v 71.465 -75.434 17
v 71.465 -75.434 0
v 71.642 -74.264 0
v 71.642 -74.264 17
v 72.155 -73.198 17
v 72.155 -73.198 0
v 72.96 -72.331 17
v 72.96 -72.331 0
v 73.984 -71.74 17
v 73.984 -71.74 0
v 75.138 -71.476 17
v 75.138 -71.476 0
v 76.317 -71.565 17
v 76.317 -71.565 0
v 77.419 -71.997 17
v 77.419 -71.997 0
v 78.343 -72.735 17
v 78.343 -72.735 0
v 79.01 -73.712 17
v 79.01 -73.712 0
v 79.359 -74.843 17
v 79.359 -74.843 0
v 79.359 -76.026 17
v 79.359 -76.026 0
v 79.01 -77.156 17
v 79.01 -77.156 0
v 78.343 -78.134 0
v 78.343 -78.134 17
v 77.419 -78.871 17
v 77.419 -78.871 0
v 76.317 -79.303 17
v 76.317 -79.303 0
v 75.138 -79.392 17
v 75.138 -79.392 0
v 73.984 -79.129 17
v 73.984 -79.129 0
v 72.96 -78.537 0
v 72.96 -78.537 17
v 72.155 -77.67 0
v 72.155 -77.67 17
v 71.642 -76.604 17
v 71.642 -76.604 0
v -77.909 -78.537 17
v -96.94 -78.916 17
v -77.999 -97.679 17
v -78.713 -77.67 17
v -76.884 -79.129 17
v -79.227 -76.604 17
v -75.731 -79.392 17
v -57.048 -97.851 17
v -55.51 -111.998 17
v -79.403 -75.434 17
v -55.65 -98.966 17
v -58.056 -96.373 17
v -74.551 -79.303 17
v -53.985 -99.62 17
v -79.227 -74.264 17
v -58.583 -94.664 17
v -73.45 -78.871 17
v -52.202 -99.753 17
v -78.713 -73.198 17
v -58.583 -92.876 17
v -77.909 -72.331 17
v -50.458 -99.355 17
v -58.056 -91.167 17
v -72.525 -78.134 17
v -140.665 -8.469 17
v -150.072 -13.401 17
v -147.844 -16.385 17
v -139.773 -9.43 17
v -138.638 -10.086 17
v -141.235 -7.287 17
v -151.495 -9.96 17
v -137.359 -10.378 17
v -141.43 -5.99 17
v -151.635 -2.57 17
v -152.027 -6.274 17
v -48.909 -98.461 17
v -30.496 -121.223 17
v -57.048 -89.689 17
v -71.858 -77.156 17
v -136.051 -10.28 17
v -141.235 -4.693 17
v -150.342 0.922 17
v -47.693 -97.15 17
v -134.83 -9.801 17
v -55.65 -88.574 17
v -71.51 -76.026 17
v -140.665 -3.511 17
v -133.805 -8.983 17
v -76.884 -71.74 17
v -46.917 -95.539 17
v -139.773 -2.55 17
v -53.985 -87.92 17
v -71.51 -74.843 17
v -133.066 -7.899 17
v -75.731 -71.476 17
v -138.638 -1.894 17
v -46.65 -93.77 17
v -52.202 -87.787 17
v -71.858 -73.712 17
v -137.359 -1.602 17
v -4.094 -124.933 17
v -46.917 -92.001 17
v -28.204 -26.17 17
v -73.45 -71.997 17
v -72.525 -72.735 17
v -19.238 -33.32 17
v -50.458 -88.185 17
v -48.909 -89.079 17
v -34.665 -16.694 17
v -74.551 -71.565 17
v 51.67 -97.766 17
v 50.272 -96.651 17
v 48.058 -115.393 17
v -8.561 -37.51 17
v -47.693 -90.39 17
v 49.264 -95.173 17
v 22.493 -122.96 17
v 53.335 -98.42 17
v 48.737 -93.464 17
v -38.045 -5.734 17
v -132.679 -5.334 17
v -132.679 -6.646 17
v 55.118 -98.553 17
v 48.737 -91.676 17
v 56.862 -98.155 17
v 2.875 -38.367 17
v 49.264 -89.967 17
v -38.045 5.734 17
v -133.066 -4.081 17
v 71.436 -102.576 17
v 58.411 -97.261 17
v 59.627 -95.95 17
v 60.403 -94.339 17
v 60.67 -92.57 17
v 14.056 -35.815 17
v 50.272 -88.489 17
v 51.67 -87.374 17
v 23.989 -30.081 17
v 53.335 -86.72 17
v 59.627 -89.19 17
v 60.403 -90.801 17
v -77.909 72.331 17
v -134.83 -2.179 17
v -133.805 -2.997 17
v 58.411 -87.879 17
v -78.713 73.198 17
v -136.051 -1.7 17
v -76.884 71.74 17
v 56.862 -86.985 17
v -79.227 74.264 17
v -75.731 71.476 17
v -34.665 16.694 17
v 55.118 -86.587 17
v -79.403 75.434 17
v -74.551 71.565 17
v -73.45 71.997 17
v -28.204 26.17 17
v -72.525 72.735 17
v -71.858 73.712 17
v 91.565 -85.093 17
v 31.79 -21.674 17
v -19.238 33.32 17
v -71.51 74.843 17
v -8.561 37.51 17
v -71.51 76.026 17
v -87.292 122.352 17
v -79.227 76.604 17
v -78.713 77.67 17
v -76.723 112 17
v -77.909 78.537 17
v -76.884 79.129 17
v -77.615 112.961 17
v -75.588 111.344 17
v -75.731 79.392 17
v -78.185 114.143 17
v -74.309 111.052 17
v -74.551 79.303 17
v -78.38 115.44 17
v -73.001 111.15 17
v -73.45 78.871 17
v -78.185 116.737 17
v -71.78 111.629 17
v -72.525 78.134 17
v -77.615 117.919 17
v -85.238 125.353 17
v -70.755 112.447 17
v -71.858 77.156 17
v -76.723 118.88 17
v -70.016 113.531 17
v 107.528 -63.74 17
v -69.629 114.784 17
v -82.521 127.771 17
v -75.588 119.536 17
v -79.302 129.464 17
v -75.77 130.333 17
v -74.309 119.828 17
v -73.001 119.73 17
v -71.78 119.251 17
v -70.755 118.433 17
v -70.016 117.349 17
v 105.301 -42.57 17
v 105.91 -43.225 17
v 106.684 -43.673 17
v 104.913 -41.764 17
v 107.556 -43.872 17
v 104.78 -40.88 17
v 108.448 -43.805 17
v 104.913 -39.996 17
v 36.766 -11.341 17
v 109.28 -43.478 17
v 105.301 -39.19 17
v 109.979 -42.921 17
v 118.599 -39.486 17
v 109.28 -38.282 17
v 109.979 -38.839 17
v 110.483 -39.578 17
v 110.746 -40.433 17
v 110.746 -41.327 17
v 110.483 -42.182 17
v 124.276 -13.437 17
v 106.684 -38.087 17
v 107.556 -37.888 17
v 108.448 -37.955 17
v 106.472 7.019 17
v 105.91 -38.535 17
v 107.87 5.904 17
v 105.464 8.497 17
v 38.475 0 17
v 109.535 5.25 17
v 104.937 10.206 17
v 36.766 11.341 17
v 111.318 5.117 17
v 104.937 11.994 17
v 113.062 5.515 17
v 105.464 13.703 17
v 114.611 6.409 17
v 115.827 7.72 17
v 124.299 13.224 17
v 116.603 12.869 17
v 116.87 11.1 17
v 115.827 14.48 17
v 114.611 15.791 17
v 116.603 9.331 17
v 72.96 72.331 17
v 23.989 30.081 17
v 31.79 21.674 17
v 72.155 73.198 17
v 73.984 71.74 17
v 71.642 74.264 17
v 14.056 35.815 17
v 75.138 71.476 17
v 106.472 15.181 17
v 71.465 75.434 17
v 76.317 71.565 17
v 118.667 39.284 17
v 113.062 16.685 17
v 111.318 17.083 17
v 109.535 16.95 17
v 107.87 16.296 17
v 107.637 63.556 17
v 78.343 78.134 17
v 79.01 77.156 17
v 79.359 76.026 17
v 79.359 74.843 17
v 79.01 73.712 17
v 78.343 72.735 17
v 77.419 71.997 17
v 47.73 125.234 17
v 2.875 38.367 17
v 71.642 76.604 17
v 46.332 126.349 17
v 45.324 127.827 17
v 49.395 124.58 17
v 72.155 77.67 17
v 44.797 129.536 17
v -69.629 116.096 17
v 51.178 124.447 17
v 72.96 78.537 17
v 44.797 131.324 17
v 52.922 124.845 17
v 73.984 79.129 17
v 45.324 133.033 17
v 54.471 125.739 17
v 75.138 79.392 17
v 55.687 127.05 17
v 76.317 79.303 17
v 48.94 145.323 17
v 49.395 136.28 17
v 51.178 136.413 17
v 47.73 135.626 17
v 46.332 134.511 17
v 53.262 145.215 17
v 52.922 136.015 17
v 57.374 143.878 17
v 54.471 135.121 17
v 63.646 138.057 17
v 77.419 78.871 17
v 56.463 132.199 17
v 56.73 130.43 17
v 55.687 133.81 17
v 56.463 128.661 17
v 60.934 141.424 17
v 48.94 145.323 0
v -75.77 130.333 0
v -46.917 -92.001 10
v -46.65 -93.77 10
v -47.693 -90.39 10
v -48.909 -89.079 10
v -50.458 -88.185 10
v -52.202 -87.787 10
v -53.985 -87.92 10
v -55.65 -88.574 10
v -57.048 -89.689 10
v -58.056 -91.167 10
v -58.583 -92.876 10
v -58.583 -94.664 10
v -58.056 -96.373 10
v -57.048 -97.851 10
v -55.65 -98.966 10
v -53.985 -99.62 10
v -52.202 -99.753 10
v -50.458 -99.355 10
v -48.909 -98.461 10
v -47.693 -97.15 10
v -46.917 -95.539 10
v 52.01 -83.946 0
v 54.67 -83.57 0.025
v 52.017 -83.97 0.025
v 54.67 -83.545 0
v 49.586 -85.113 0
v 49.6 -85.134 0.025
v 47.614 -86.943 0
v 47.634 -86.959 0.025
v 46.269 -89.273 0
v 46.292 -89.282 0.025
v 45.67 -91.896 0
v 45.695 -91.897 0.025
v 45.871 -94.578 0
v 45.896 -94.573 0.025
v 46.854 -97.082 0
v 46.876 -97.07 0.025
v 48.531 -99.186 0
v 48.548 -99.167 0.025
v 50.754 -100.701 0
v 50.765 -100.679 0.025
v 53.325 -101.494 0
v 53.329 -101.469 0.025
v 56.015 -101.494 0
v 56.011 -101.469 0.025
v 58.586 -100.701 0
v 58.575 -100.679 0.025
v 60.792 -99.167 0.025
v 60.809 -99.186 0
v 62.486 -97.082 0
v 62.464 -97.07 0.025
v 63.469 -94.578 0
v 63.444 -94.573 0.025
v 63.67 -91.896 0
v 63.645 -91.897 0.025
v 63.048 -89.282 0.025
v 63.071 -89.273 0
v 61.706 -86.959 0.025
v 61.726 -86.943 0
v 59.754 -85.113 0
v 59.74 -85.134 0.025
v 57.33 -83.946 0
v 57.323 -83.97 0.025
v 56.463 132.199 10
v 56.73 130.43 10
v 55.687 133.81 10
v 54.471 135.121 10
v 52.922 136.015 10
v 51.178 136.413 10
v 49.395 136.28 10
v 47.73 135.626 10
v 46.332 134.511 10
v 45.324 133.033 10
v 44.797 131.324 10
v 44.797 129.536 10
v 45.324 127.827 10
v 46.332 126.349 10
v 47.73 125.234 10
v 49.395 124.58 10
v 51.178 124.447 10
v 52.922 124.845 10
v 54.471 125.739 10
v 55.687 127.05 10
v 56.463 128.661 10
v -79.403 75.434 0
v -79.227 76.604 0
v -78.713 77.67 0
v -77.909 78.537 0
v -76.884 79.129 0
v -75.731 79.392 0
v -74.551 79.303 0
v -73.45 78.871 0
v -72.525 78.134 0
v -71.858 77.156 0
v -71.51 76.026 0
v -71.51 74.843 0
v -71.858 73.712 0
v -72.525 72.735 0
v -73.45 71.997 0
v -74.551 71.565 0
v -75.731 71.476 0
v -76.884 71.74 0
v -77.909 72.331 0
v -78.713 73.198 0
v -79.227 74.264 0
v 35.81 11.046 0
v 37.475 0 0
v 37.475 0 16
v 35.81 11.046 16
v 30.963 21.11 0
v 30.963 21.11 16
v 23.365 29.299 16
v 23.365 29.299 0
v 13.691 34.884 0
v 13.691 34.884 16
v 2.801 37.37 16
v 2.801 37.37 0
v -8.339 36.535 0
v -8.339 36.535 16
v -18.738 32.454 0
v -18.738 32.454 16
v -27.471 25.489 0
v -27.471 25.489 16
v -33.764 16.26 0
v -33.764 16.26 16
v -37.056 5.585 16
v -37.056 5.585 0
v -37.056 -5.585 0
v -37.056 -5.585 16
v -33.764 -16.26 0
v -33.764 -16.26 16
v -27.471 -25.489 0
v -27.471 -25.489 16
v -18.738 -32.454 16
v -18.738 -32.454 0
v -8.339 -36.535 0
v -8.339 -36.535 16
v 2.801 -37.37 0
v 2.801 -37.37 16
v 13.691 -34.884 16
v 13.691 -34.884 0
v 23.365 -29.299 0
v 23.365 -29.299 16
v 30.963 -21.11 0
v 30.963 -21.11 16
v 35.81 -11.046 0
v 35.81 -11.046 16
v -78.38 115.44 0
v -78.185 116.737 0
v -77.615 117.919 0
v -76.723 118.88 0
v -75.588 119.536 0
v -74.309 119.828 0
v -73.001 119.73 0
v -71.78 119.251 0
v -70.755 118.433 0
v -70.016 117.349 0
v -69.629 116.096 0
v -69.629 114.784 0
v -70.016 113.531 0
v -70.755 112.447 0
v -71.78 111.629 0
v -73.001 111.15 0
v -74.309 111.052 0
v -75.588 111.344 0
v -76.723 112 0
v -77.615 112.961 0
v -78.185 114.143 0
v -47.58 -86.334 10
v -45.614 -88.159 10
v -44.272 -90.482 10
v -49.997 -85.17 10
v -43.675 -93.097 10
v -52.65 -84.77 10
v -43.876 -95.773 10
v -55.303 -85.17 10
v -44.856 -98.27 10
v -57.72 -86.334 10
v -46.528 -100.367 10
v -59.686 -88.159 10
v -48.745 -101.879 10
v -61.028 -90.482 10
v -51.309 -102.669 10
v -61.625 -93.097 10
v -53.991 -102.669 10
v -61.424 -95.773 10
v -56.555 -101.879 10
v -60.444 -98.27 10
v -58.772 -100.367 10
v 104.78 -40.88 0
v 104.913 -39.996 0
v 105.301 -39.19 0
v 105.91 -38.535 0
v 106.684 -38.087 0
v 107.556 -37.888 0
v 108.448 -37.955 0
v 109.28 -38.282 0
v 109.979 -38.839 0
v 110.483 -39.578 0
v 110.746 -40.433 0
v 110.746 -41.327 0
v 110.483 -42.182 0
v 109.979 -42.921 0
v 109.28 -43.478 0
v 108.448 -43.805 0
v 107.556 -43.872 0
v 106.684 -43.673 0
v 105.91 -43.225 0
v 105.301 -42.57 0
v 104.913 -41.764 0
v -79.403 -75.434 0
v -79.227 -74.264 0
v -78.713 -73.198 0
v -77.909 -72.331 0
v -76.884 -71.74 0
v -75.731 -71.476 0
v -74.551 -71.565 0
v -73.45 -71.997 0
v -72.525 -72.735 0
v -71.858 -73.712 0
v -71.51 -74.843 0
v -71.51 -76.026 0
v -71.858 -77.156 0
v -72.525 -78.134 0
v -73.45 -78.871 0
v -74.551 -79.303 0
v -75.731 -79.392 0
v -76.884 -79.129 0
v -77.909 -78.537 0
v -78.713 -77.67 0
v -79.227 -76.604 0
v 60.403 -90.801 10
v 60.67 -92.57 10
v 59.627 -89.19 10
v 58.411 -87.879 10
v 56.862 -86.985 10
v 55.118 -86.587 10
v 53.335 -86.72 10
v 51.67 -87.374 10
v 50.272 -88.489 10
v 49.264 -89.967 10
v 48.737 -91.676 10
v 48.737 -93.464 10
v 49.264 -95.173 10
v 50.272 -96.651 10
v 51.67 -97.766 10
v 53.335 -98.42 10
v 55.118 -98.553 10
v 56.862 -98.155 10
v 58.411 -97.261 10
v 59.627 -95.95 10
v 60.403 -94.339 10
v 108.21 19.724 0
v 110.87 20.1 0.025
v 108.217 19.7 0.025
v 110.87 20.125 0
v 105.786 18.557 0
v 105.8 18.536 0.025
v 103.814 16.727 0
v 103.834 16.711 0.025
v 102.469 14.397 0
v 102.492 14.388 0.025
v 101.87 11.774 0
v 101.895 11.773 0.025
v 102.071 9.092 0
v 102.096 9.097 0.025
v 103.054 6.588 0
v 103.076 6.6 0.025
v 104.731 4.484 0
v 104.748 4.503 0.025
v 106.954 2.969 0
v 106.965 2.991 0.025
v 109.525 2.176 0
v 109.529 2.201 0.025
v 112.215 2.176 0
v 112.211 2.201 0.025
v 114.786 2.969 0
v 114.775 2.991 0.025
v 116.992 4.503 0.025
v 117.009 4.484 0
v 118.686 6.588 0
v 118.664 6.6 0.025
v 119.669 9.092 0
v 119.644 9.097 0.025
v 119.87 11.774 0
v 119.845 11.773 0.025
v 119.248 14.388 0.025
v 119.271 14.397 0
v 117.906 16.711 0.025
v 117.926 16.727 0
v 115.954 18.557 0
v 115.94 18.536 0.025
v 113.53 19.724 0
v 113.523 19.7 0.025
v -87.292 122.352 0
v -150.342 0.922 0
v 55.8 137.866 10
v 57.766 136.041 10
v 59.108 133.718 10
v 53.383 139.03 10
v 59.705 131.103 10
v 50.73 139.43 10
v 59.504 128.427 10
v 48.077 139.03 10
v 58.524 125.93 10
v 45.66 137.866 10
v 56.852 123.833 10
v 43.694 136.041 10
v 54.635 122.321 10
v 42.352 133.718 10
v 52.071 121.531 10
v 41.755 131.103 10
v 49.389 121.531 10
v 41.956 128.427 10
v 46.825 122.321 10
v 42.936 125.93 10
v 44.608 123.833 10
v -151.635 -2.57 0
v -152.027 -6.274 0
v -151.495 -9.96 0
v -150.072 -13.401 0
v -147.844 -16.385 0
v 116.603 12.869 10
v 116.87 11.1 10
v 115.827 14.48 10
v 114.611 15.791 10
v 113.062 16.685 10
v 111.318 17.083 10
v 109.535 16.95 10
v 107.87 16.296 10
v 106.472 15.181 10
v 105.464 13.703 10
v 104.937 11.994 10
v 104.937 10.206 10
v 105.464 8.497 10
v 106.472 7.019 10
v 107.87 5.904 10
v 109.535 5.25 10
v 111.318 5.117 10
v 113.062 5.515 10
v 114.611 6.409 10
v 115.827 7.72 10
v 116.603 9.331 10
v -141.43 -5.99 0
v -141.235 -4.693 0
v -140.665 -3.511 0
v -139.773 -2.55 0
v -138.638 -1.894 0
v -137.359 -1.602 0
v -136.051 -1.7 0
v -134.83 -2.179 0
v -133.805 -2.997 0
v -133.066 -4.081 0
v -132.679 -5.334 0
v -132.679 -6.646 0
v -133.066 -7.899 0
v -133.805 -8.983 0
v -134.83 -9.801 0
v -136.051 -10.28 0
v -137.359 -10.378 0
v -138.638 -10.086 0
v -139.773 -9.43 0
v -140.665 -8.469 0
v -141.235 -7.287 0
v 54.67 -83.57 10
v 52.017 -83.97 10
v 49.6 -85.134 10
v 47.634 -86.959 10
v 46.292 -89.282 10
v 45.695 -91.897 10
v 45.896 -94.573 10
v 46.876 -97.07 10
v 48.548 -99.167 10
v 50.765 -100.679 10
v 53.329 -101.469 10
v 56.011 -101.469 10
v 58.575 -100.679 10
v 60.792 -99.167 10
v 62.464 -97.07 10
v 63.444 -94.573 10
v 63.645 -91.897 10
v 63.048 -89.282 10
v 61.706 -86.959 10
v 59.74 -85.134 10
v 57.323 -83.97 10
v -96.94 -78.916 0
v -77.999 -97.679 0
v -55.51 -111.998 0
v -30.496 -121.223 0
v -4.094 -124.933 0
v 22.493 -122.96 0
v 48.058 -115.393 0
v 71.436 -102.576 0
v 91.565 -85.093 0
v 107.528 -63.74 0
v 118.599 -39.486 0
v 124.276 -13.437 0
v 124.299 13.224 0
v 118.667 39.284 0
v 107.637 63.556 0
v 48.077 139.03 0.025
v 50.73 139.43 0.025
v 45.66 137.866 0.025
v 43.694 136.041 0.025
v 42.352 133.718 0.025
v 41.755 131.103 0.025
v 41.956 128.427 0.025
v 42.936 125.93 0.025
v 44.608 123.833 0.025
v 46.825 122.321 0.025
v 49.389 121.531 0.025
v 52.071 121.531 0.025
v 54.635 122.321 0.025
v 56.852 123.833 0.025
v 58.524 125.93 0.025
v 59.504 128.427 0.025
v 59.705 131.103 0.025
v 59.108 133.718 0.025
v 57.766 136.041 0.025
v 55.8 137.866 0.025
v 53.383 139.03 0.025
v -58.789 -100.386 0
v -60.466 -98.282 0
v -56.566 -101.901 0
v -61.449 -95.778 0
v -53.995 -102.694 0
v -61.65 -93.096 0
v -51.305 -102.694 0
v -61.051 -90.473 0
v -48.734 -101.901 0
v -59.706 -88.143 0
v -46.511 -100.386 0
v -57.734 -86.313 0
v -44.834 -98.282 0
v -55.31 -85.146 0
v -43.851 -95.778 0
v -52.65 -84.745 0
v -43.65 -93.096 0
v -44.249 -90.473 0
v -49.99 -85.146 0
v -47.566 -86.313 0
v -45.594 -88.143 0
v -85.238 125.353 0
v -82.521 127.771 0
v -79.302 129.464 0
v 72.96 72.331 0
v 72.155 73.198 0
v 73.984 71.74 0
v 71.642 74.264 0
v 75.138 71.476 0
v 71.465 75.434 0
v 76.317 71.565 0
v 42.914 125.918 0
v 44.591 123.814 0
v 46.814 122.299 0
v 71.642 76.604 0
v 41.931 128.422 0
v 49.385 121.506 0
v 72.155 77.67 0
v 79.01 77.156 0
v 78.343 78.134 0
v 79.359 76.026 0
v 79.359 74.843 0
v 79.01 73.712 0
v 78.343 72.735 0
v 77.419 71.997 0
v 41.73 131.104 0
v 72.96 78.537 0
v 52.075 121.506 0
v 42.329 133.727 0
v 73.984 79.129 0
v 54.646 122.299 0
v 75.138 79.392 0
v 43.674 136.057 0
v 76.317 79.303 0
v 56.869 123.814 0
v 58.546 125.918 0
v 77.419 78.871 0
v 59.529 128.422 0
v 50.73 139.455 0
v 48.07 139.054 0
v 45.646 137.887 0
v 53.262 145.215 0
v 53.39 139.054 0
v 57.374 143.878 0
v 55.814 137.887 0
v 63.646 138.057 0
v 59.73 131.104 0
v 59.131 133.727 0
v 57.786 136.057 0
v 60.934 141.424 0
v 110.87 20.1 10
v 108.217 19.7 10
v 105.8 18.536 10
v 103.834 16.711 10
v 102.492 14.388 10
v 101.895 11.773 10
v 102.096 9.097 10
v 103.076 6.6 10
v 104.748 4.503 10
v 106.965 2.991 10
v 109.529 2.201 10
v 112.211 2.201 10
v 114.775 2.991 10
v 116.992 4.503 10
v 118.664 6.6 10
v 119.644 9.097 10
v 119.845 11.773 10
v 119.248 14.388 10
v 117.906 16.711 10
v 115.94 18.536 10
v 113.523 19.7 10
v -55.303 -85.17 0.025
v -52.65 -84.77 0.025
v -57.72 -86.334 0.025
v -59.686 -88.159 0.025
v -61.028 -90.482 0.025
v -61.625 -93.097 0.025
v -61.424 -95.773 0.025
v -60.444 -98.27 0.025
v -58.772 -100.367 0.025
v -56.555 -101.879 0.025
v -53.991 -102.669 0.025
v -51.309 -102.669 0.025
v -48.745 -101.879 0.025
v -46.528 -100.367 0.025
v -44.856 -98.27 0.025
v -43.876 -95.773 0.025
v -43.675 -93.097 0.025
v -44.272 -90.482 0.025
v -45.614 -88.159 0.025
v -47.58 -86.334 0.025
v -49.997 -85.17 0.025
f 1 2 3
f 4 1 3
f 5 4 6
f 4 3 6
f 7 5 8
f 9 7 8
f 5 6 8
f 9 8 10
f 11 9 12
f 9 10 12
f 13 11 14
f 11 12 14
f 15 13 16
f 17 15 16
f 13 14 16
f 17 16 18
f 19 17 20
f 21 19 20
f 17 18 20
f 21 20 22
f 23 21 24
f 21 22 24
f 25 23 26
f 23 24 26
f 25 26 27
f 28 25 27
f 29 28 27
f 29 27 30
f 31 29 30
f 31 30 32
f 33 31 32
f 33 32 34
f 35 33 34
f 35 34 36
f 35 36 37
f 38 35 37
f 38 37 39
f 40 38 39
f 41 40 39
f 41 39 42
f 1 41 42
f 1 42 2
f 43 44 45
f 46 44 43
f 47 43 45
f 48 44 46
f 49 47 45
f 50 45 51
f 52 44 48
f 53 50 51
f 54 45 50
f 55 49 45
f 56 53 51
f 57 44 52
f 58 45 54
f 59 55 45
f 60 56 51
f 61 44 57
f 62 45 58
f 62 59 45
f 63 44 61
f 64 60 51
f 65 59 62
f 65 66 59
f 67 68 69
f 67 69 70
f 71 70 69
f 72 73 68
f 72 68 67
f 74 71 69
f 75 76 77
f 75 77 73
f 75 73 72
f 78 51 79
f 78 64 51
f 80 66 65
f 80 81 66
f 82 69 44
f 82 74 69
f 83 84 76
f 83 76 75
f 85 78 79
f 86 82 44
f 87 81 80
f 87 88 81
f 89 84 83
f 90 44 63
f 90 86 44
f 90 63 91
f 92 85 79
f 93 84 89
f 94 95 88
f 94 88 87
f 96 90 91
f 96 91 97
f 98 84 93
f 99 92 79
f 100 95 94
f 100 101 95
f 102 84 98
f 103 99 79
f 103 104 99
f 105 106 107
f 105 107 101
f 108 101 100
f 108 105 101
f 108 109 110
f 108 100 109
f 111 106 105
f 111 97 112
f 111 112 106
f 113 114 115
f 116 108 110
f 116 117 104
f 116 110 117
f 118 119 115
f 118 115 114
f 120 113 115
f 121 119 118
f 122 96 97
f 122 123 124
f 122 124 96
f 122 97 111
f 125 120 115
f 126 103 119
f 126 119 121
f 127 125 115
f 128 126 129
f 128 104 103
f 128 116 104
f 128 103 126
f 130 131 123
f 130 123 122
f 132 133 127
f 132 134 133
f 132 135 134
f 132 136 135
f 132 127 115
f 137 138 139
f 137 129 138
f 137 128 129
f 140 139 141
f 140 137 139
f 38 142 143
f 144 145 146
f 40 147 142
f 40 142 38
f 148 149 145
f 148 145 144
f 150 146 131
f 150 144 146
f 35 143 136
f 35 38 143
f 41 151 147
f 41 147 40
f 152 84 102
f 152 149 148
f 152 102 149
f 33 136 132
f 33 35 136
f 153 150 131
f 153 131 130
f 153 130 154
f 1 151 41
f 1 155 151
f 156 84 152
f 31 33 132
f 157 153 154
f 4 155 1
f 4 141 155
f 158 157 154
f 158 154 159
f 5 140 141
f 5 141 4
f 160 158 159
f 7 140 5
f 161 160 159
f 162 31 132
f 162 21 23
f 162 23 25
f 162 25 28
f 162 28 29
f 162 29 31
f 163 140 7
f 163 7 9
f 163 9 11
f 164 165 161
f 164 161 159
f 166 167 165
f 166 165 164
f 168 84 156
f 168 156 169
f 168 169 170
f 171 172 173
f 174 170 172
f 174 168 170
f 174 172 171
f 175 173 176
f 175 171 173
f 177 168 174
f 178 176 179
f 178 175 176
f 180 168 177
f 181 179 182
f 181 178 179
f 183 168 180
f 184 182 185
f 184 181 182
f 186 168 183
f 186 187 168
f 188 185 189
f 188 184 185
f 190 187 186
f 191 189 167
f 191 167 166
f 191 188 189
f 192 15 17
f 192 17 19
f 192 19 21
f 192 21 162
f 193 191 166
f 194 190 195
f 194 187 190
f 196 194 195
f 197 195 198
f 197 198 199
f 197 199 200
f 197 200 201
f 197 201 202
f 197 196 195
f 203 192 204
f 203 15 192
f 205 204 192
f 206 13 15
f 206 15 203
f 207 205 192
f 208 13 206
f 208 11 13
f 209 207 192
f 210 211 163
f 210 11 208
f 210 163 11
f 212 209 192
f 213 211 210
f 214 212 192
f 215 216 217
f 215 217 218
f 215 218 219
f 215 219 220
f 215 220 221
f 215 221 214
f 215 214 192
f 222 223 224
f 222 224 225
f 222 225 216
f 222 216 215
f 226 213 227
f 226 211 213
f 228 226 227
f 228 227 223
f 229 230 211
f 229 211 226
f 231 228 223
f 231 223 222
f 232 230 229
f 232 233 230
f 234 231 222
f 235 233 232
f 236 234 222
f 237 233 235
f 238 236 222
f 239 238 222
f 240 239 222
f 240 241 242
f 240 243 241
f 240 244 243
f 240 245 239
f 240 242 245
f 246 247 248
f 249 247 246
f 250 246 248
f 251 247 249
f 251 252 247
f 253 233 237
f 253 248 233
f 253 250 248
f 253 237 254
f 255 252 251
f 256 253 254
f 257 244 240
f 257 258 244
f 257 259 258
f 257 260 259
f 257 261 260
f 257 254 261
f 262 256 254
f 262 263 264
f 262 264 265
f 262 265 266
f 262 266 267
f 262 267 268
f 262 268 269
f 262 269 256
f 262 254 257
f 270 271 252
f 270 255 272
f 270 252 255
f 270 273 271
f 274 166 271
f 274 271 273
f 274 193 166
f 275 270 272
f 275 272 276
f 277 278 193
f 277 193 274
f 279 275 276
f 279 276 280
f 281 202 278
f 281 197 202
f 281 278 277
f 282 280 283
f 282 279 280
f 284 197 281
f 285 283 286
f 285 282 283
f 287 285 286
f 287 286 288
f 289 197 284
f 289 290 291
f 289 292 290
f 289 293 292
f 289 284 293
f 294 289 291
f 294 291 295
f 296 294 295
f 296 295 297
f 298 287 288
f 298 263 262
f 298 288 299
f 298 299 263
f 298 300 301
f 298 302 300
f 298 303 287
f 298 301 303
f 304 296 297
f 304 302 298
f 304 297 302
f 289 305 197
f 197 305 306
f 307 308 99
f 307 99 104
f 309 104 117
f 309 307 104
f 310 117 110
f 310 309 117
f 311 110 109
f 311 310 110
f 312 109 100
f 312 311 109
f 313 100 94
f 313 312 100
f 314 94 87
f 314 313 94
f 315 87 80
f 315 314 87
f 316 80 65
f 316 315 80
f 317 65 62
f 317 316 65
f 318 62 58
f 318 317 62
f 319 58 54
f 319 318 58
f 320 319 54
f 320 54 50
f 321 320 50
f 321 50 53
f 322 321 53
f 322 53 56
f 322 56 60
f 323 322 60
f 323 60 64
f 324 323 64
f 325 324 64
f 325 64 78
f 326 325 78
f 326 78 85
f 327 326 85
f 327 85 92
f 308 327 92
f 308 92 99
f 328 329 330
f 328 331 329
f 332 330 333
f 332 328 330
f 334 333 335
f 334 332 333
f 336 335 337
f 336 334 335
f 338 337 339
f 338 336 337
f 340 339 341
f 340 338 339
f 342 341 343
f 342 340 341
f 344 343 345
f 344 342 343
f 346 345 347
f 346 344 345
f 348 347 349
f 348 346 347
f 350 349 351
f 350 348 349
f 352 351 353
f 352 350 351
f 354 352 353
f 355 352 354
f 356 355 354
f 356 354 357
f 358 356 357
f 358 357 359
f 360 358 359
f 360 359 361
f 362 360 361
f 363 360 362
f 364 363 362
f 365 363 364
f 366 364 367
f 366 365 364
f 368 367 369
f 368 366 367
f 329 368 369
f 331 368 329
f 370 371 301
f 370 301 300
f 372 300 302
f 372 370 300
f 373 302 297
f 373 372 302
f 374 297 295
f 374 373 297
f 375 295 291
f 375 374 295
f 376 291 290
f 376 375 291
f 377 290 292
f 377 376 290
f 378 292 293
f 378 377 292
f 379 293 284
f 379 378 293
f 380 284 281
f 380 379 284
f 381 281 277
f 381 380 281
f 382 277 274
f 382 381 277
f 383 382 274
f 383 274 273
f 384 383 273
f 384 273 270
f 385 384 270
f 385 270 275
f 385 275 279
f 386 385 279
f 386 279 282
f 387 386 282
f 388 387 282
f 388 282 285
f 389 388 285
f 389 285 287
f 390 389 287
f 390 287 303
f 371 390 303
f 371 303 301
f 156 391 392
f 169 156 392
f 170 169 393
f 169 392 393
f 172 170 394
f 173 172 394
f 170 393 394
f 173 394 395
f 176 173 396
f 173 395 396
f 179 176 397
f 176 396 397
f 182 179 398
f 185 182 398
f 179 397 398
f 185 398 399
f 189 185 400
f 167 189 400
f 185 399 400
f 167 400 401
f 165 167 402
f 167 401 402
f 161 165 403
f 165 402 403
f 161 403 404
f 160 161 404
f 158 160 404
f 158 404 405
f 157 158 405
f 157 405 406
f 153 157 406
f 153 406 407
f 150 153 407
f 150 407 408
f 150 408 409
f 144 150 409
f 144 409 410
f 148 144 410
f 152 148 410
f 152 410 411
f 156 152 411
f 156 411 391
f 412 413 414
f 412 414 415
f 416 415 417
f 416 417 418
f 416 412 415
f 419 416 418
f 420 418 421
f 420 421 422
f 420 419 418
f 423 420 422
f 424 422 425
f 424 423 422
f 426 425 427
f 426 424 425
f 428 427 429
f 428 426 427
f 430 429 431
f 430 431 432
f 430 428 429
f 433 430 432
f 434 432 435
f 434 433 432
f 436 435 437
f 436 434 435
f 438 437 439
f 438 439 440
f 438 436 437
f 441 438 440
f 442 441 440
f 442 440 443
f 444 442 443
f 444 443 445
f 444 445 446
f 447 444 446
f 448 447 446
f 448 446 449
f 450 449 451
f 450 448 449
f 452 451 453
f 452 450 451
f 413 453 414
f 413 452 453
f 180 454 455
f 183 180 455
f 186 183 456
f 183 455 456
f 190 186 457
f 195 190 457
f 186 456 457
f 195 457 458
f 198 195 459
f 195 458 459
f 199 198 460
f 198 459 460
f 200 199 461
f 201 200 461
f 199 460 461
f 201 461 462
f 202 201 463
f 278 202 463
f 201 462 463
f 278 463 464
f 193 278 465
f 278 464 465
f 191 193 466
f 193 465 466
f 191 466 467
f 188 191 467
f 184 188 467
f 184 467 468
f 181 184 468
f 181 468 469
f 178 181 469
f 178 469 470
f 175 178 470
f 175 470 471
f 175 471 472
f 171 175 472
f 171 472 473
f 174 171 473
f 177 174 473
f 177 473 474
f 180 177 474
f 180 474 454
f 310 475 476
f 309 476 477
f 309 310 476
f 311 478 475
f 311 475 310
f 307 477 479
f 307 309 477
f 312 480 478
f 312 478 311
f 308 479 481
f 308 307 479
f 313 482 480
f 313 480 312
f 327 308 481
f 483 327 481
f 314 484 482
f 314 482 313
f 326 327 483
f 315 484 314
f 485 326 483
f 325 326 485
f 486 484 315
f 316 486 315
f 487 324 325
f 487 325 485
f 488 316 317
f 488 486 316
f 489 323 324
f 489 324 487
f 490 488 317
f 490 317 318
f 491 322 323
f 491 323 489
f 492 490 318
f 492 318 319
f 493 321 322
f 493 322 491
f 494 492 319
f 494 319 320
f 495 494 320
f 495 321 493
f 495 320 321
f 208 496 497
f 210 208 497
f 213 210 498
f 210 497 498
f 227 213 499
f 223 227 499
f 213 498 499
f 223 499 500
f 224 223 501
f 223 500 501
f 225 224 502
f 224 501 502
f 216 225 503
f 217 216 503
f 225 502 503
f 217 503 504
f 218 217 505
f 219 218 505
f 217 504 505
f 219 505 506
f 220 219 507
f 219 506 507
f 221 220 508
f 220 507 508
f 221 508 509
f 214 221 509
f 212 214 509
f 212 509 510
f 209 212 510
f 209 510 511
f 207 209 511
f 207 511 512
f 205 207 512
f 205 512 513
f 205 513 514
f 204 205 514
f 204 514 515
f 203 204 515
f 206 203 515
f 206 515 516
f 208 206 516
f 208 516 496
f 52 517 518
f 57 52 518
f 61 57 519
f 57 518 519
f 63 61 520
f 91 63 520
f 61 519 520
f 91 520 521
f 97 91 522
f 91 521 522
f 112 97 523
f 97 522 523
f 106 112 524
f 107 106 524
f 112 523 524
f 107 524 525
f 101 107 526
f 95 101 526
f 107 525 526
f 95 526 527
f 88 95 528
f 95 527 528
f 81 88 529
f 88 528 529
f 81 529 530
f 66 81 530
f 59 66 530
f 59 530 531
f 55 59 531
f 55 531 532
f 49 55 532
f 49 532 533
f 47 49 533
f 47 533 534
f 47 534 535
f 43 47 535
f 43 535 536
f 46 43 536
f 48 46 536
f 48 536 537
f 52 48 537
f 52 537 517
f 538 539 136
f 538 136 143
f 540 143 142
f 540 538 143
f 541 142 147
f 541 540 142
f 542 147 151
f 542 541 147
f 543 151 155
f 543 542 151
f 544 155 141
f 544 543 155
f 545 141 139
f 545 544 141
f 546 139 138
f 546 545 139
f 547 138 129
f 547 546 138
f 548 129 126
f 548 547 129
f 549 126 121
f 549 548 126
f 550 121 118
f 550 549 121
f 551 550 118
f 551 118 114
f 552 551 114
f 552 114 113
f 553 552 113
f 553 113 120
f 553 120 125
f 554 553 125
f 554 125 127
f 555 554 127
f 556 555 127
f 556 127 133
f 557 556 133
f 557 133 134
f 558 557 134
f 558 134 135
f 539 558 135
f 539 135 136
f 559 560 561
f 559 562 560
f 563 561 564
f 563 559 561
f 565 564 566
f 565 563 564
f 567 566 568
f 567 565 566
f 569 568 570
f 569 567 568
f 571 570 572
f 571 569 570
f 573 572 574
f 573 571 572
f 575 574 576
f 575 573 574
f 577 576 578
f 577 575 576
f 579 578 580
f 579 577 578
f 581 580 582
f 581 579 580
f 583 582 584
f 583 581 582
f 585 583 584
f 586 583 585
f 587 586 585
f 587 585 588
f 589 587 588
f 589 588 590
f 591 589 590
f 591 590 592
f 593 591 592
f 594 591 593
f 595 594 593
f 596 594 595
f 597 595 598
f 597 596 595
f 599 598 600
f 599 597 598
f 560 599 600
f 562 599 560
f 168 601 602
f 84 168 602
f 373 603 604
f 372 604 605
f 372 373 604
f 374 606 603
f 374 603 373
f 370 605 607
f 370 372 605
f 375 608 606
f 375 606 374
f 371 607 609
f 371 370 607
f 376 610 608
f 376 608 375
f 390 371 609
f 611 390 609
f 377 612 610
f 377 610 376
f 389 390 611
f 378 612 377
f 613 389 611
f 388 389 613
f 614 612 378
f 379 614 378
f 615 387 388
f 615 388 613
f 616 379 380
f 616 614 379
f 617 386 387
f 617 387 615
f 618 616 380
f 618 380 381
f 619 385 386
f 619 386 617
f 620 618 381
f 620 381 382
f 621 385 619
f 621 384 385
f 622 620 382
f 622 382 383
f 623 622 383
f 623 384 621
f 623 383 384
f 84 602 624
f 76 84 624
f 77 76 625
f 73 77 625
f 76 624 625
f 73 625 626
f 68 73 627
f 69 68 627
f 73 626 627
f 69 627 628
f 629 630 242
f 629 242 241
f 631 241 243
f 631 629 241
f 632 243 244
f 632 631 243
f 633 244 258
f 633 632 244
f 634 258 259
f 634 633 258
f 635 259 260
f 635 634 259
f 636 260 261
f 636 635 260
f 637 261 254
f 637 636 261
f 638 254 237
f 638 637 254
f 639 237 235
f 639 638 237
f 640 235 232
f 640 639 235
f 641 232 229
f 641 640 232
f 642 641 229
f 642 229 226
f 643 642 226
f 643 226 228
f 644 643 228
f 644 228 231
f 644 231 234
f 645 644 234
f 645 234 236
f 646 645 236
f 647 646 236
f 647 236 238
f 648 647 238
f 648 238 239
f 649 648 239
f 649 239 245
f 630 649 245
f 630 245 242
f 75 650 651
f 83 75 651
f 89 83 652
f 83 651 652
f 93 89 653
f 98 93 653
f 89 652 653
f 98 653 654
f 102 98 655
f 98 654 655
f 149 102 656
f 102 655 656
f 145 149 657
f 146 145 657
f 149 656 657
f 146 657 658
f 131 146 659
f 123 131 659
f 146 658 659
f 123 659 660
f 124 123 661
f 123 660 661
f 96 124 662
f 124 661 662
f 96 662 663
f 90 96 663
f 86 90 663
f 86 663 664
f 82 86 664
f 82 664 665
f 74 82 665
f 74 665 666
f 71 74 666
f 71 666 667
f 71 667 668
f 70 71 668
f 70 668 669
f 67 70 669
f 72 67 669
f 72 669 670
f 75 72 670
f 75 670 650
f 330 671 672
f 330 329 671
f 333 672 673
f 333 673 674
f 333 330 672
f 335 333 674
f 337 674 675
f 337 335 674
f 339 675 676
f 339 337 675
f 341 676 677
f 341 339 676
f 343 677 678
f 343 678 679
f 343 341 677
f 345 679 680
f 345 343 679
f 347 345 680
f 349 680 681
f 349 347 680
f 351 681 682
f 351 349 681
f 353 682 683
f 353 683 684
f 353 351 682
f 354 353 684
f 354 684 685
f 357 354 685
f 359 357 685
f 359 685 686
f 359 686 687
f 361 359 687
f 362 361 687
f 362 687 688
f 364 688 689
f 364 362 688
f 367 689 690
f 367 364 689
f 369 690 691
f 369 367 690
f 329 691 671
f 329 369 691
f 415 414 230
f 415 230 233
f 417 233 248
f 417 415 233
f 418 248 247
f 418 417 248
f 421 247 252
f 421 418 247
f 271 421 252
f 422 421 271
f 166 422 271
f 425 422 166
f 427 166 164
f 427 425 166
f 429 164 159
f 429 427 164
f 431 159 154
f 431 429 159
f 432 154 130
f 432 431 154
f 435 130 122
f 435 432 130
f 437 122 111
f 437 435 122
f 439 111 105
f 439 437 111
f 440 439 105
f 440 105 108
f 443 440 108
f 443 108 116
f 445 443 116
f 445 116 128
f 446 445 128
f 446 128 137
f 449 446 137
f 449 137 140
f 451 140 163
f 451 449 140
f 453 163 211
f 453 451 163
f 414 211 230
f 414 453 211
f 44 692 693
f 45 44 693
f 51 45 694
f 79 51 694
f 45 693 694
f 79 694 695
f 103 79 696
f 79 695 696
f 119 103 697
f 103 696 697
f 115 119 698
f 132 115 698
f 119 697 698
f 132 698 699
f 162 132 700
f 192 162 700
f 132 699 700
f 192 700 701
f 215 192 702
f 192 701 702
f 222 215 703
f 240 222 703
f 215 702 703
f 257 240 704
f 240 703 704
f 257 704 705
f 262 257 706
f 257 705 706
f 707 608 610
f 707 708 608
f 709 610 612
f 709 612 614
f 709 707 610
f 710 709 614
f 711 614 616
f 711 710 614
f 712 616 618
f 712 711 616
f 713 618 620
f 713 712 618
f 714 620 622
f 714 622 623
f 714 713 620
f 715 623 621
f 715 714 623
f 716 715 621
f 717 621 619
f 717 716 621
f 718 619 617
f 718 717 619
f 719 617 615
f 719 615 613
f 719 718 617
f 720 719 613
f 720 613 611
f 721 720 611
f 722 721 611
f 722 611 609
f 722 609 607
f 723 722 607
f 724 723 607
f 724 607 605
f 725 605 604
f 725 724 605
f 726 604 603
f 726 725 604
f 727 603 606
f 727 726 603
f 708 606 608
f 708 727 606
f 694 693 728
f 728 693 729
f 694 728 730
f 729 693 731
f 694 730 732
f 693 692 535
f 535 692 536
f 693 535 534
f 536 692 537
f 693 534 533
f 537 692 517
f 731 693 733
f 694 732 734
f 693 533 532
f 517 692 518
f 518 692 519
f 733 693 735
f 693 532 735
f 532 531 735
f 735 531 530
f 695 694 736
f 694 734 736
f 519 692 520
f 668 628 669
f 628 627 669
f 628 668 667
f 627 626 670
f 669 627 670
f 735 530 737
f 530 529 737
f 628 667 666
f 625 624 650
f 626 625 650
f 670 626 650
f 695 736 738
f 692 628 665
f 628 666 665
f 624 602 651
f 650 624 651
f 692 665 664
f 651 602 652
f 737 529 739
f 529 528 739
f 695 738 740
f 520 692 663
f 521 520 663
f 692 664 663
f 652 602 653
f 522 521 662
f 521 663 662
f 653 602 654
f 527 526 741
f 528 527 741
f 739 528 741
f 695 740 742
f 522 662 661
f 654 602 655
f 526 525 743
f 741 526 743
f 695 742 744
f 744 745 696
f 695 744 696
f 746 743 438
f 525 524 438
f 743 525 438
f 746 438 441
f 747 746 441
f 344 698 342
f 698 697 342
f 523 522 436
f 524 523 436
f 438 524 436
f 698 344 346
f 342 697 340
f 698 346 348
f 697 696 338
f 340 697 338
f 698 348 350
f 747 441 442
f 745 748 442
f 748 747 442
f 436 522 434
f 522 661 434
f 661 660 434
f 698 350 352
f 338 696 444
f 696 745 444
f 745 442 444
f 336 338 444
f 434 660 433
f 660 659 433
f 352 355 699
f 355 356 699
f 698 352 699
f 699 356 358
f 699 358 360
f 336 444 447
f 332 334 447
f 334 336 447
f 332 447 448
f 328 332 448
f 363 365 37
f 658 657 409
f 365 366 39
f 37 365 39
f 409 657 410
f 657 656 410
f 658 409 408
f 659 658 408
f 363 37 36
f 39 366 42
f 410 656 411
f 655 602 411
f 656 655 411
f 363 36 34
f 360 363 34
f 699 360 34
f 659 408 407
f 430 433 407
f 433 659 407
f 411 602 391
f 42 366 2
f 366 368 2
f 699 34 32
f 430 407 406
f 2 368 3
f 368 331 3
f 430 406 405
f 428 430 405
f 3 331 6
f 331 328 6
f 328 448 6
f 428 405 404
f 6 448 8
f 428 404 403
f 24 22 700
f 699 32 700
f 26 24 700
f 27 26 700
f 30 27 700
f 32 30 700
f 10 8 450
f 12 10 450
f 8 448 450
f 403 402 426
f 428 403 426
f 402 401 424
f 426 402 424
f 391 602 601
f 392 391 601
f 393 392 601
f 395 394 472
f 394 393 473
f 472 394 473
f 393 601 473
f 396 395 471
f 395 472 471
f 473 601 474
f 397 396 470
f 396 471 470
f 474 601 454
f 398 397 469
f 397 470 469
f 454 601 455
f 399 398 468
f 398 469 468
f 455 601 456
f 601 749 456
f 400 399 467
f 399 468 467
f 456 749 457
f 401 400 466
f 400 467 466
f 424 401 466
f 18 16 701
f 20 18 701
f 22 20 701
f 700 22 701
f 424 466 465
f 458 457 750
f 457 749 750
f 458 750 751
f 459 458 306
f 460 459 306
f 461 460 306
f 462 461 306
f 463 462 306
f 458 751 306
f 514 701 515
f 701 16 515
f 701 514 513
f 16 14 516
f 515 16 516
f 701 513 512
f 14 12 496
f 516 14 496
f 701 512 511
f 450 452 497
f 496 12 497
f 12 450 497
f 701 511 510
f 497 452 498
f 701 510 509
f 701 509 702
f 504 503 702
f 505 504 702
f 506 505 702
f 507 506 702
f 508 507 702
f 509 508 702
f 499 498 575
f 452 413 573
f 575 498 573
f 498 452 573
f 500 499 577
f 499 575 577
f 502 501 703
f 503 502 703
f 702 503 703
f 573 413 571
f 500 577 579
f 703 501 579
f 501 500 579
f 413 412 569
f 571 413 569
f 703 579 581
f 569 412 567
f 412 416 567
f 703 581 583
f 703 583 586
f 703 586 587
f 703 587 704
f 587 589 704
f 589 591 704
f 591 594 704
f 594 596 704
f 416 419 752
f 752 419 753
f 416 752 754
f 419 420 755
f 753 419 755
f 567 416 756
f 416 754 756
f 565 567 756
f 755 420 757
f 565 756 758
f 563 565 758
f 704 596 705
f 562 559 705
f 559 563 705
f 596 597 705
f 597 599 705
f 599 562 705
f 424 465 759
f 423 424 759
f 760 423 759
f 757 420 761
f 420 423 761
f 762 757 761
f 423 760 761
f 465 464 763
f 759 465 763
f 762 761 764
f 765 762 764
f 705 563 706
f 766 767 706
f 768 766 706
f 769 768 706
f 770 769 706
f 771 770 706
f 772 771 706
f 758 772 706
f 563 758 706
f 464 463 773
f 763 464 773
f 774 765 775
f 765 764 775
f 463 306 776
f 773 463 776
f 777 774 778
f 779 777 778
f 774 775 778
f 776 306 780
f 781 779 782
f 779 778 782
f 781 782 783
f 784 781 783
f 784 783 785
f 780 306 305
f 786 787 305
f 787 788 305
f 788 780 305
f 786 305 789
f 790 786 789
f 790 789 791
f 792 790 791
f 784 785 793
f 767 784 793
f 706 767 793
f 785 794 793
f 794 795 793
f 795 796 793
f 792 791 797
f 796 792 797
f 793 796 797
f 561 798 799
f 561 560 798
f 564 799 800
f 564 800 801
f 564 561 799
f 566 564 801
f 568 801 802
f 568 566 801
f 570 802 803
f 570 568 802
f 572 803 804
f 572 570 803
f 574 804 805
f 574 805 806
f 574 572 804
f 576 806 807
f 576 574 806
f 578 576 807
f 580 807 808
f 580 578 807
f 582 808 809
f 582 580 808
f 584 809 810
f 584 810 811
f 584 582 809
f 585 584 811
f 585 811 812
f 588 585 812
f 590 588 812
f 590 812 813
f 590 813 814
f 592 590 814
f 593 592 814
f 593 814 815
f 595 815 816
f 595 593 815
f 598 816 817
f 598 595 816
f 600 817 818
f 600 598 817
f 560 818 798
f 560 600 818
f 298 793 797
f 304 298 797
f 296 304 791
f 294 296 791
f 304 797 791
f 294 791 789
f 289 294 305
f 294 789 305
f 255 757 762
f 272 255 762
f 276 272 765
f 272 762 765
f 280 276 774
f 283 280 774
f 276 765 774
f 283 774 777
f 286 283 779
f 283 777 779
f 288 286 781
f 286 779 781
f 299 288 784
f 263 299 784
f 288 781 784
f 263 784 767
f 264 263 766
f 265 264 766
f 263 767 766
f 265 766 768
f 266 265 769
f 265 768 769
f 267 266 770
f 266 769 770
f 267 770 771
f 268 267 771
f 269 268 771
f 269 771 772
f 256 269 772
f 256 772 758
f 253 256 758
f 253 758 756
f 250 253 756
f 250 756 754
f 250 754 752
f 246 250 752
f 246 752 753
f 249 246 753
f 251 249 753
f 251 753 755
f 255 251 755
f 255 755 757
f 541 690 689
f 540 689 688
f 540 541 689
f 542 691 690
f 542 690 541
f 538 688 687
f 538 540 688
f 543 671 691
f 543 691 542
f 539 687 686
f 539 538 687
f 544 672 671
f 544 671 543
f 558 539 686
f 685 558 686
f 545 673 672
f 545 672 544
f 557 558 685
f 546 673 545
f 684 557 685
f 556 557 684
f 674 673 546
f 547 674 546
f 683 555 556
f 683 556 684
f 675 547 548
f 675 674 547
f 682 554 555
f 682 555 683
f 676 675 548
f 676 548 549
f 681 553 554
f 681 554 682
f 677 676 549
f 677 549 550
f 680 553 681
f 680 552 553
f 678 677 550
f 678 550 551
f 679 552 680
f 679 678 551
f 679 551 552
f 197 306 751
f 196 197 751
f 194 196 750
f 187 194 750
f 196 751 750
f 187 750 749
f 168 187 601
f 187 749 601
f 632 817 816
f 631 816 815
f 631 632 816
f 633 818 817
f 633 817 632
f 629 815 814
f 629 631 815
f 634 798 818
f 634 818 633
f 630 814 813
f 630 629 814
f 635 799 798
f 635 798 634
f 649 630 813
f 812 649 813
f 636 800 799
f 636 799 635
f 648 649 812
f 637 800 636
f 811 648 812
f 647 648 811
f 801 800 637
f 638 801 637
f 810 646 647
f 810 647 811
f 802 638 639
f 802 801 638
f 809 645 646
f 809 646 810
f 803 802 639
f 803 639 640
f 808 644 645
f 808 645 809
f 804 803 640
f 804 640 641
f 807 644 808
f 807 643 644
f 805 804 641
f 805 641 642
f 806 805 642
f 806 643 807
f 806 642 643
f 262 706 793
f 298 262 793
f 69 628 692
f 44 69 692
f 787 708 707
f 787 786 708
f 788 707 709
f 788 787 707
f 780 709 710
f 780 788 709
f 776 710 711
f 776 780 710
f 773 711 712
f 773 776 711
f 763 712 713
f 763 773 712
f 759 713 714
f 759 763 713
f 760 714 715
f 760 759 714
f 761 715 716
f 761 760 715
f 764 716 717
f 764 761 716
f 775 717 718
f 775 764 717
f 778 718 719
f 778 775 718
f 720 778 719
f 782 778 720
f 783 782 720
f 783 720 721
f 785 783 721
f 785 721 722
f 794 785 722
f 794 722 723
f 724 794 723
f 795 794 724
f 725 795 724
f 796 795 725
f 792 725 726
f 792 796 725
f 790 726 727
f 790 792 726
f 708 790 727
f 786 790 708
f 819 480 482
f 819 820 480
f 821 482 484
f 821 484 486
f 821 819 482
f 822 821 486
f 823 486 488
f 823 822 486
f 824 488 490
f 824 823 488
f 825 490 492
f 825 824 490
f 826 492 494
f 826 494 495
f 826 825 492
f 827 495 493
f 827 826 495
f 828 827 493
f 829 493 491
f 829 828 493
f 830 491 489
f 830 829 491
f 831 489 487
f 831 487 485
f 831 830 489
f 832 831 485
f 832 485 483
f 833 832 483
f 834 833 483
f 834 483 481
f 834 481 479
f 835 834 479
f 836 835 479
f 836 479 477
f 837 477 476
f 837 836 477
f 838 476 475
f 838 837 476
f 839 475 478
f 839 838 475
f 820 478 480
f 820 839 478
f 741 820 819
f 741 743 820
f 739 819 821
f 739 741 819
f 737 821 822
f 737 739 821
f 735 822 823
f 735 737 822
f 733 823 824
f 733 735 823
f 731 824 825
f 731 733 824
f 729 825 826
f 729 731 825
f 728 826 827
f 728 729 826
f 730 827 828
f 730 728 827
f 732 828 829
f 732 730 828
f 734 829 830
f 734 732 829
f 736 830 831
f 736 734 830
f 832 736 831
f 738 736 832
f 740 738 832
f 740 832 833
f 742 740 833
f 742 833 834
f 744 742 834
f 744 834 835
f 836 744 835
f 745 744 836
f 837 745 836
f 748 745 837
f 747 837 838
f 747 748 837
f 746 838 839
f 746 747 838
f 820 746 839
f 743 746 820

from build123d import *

# Parameters (mm, degrees)
SKETCH1_R                         = 37.475
SKETCH1_R_2                       = 4
SKETCH1_R_3                       = 6
SKETCH1_R_4                       = 1.687903887
BOSS_EXTRUDE1_DEPTH               = 17
M10X1_25_TAPPED_HOLE1_D           = 8.8
M10X1_25_TAPPED_HOLE1_ON_FACE_2_D = 8.8
F_6_0MM_DOWEL_HOLE1_D             = 6
F_3_8_16_TAPPED_HOLE1_D           = 7.9375
CHAMFER1_SIZE                     = 1
CBORE_FOR_M10_SHCS1_AT_2_COUNT    = 2
CBORE_FOR_M10_SHCS1_AT_2_PITCH    = 133.628097719
CBORE_FOR_M10_SHCS1_AT_3_COUNT    = 2
CBORE_FOR_M10_SHCS1_AT_3_PITCH    = 223.034803562
CBORE_FOR_M10_SHCS1_AT_4_COUNT    = 2
CBORE_FOR_M10_SHCS1_AT_4_PITCH    = 246.886744075


with BuildPart() as part:
    # Sketch1 → Boss-Extrude1 (new body)
    with BuildSketch(Plane.XY):
        with BuildLine():
            Line((-147.843963588, -16.38510421), (-96.939761408, -78.915668014))
            ThreePointArc((-96.939761408, -78.915668014), (71.436269945, -102.576114843), (107.636664229, 63.55586923))
            Line((107.636664229, 63.55586923), (63.646399708, 138.056704308))
            ThreePointArc((63.646399708, 138.056704308), (57.374372961, 143.878133995), (48.939902164, 145.322801944))
            Line((48.939902164, 145.322801944), (-75.770097836, 130.332801944))
            ThreePointArc((-75.770097836, 130.332801944), (-82.520736984, 127.771091264), (-87.292449774, 122.352212454))
            Line((-87.292449774, 122.352212454), (-150.342449774, 0.922212454))
            ThreePointArc((-150.342449774, 0.922212454), (-151.87610245, -8.133185025), (-147.843963588, -16.38510421))
        make_face()
        Circle(SKETCH1_R, mode=Mode.SUBTRACT)
        with Locations((-73.98, 115.44)):
            Circle(SKETCH1_R_2, mode=Mode.SUBTRACT)
        with Locations((50.73, 130.43)):
            Circle(SKETCH1_R_3, mode=Mode.SUBTRACT)
        with Locations((110.87, 11.1)):
            Circle(SKETCH1_R_3, mode=Mode.SUBTRACT)
        with Locations((107.78, -40.88)):
            Circle(SKETCH1_R_4, mode=Mode.SUBTRACT)
        with Locations((54.67, -92.57)):
            Circle(SKETCH1_R_3, mode=Mode.SUBTRACT)
        with Locations((-52.65, -93.77)):
            Circle(SKETCH1_R_3, mode=Mode.SUBTRACT)
        with Locations((-137.03, -5.99)):
            Circle(SKETCH1_R_2, mode=Mode.SUBTRACT)
    extrude(amount=BOSS_EXTRUDE1_DEPTH)

    # M10x1.25 Tapped Hole1 (through all)
    with Locations(Plane(origin=(-73.98, 115.44, 17), x_dir=(1, 0, 0), z_dir=(0, 0, 1))):
        with Locations((0, 0)):
            Hole(M10X1_25_TAPPED_HOLE1_D / 2)

    # M10x1.25 Tapped Hole1 on face 2 (through all)
    with Locations(Plane(origin=(-137.03, -5.99, 0), x_dir=(1, 0, 0), z_dir=(0, 0, 1))):
        with Locations((0, 0)):
            Hole(M10X1_25_TAPPED_HOLE1_ON_FACE_2_D / 2)

    # Ø6.0mm Dowel Hole1 (through all)
    with Locations(Plane(origin=(107.78, -40.88, 17), x_dir=(1, 0, 0), z_dir=(0, 0, 1))):
        with Locations((0, 0)):
            Hole(F_6_0MM_DOWEL_HOLE1_D / 2)

    # 3/8-16 Tapped Hole1 (through all)
    with Locations(Plane(origin=(-75.434151417, 75.434151417, 17), x_dir=(1, 0, 0), z_dir=(0, 0, 1))):
        with Locations((0, 0), (0, -150.868302834), (150.868302834, -150.868302834), (150.868302834, 0)):
            Hole(F_3_8_16_TAPPED_HOLE1_D / 2)

    # Chamfer1
    chamfer1_edges = [part.edges().sort_by_distance(p)[0] for p in [
        (-37.475, 0, 17),
    ]]
    chamfer(chamfer1_edges, length=CHAMFER1_SIZE)

    # Sketch12 → CBORE for M10 SHCS1 (revolve, cut)
    with BuildSketch(Plane(origin=(50.73, 130.43, 0), x_dir=(0, 1, 0), z_dir=(1, 0, 0))):
        Polygon((0, 0), (0, 17), (5.25, 17), (5.25, 10), (9, 10), (9, 0.025), (9.025, 0), align=None)
    cbore_for_m10_shcs1 = revolve(axis=Axis((50.73, 130.43, -6.35), (0, 0, 1)), mode=Mode.SUBTRACT)

    # CBORE for M10 SHCS1 at 2: CBORE for M10 SHCS1 ×2
    with Locations(*[Vector(0.45005504850082595, -0.8930008137280274, 0) * (i * CBORE_FOR_M10_SHCS1_AT_2_PITCH) for i in range(1, CBORE_FOR_M10_SHCS1_AT_2_COUNT)]):
        add(cbore_for_m10_shcs1, mode=Mode.SUBTRACT)

    # CBORE for M10 SHCS1 at 3: CBORE for M10 SHCS1 ×2
    with Locations(*[Vector(0.017665404399104877, -0.9998439545686197, 0) * (i * CBORE_FOR_M10_SHCS1_AT_3_PITCH) for i in range(1, CBORE_FOR_M10_SHCS1_AT_3_COUNT)]):
        add(cbore_for_m10_shcs1, mode=Mode.SUBTRACT)

    # CBORE for M10 SHCS1 at 4: CBORE for M10 SHCS1 ×2
    with Locations(*[Vector(-0.4187345107866802, -0.9081086991523866, 0) * (i * CBORE_FOR_M10_SHCS1_AT_4_PITCH) for i in range(1, CBORE_FOR_M10_SHCS1_AT_4_COUNT)]):
        add(cbore_for_m10_shcs1, mode=Mode.SUBTRACT)


solid = part.part
